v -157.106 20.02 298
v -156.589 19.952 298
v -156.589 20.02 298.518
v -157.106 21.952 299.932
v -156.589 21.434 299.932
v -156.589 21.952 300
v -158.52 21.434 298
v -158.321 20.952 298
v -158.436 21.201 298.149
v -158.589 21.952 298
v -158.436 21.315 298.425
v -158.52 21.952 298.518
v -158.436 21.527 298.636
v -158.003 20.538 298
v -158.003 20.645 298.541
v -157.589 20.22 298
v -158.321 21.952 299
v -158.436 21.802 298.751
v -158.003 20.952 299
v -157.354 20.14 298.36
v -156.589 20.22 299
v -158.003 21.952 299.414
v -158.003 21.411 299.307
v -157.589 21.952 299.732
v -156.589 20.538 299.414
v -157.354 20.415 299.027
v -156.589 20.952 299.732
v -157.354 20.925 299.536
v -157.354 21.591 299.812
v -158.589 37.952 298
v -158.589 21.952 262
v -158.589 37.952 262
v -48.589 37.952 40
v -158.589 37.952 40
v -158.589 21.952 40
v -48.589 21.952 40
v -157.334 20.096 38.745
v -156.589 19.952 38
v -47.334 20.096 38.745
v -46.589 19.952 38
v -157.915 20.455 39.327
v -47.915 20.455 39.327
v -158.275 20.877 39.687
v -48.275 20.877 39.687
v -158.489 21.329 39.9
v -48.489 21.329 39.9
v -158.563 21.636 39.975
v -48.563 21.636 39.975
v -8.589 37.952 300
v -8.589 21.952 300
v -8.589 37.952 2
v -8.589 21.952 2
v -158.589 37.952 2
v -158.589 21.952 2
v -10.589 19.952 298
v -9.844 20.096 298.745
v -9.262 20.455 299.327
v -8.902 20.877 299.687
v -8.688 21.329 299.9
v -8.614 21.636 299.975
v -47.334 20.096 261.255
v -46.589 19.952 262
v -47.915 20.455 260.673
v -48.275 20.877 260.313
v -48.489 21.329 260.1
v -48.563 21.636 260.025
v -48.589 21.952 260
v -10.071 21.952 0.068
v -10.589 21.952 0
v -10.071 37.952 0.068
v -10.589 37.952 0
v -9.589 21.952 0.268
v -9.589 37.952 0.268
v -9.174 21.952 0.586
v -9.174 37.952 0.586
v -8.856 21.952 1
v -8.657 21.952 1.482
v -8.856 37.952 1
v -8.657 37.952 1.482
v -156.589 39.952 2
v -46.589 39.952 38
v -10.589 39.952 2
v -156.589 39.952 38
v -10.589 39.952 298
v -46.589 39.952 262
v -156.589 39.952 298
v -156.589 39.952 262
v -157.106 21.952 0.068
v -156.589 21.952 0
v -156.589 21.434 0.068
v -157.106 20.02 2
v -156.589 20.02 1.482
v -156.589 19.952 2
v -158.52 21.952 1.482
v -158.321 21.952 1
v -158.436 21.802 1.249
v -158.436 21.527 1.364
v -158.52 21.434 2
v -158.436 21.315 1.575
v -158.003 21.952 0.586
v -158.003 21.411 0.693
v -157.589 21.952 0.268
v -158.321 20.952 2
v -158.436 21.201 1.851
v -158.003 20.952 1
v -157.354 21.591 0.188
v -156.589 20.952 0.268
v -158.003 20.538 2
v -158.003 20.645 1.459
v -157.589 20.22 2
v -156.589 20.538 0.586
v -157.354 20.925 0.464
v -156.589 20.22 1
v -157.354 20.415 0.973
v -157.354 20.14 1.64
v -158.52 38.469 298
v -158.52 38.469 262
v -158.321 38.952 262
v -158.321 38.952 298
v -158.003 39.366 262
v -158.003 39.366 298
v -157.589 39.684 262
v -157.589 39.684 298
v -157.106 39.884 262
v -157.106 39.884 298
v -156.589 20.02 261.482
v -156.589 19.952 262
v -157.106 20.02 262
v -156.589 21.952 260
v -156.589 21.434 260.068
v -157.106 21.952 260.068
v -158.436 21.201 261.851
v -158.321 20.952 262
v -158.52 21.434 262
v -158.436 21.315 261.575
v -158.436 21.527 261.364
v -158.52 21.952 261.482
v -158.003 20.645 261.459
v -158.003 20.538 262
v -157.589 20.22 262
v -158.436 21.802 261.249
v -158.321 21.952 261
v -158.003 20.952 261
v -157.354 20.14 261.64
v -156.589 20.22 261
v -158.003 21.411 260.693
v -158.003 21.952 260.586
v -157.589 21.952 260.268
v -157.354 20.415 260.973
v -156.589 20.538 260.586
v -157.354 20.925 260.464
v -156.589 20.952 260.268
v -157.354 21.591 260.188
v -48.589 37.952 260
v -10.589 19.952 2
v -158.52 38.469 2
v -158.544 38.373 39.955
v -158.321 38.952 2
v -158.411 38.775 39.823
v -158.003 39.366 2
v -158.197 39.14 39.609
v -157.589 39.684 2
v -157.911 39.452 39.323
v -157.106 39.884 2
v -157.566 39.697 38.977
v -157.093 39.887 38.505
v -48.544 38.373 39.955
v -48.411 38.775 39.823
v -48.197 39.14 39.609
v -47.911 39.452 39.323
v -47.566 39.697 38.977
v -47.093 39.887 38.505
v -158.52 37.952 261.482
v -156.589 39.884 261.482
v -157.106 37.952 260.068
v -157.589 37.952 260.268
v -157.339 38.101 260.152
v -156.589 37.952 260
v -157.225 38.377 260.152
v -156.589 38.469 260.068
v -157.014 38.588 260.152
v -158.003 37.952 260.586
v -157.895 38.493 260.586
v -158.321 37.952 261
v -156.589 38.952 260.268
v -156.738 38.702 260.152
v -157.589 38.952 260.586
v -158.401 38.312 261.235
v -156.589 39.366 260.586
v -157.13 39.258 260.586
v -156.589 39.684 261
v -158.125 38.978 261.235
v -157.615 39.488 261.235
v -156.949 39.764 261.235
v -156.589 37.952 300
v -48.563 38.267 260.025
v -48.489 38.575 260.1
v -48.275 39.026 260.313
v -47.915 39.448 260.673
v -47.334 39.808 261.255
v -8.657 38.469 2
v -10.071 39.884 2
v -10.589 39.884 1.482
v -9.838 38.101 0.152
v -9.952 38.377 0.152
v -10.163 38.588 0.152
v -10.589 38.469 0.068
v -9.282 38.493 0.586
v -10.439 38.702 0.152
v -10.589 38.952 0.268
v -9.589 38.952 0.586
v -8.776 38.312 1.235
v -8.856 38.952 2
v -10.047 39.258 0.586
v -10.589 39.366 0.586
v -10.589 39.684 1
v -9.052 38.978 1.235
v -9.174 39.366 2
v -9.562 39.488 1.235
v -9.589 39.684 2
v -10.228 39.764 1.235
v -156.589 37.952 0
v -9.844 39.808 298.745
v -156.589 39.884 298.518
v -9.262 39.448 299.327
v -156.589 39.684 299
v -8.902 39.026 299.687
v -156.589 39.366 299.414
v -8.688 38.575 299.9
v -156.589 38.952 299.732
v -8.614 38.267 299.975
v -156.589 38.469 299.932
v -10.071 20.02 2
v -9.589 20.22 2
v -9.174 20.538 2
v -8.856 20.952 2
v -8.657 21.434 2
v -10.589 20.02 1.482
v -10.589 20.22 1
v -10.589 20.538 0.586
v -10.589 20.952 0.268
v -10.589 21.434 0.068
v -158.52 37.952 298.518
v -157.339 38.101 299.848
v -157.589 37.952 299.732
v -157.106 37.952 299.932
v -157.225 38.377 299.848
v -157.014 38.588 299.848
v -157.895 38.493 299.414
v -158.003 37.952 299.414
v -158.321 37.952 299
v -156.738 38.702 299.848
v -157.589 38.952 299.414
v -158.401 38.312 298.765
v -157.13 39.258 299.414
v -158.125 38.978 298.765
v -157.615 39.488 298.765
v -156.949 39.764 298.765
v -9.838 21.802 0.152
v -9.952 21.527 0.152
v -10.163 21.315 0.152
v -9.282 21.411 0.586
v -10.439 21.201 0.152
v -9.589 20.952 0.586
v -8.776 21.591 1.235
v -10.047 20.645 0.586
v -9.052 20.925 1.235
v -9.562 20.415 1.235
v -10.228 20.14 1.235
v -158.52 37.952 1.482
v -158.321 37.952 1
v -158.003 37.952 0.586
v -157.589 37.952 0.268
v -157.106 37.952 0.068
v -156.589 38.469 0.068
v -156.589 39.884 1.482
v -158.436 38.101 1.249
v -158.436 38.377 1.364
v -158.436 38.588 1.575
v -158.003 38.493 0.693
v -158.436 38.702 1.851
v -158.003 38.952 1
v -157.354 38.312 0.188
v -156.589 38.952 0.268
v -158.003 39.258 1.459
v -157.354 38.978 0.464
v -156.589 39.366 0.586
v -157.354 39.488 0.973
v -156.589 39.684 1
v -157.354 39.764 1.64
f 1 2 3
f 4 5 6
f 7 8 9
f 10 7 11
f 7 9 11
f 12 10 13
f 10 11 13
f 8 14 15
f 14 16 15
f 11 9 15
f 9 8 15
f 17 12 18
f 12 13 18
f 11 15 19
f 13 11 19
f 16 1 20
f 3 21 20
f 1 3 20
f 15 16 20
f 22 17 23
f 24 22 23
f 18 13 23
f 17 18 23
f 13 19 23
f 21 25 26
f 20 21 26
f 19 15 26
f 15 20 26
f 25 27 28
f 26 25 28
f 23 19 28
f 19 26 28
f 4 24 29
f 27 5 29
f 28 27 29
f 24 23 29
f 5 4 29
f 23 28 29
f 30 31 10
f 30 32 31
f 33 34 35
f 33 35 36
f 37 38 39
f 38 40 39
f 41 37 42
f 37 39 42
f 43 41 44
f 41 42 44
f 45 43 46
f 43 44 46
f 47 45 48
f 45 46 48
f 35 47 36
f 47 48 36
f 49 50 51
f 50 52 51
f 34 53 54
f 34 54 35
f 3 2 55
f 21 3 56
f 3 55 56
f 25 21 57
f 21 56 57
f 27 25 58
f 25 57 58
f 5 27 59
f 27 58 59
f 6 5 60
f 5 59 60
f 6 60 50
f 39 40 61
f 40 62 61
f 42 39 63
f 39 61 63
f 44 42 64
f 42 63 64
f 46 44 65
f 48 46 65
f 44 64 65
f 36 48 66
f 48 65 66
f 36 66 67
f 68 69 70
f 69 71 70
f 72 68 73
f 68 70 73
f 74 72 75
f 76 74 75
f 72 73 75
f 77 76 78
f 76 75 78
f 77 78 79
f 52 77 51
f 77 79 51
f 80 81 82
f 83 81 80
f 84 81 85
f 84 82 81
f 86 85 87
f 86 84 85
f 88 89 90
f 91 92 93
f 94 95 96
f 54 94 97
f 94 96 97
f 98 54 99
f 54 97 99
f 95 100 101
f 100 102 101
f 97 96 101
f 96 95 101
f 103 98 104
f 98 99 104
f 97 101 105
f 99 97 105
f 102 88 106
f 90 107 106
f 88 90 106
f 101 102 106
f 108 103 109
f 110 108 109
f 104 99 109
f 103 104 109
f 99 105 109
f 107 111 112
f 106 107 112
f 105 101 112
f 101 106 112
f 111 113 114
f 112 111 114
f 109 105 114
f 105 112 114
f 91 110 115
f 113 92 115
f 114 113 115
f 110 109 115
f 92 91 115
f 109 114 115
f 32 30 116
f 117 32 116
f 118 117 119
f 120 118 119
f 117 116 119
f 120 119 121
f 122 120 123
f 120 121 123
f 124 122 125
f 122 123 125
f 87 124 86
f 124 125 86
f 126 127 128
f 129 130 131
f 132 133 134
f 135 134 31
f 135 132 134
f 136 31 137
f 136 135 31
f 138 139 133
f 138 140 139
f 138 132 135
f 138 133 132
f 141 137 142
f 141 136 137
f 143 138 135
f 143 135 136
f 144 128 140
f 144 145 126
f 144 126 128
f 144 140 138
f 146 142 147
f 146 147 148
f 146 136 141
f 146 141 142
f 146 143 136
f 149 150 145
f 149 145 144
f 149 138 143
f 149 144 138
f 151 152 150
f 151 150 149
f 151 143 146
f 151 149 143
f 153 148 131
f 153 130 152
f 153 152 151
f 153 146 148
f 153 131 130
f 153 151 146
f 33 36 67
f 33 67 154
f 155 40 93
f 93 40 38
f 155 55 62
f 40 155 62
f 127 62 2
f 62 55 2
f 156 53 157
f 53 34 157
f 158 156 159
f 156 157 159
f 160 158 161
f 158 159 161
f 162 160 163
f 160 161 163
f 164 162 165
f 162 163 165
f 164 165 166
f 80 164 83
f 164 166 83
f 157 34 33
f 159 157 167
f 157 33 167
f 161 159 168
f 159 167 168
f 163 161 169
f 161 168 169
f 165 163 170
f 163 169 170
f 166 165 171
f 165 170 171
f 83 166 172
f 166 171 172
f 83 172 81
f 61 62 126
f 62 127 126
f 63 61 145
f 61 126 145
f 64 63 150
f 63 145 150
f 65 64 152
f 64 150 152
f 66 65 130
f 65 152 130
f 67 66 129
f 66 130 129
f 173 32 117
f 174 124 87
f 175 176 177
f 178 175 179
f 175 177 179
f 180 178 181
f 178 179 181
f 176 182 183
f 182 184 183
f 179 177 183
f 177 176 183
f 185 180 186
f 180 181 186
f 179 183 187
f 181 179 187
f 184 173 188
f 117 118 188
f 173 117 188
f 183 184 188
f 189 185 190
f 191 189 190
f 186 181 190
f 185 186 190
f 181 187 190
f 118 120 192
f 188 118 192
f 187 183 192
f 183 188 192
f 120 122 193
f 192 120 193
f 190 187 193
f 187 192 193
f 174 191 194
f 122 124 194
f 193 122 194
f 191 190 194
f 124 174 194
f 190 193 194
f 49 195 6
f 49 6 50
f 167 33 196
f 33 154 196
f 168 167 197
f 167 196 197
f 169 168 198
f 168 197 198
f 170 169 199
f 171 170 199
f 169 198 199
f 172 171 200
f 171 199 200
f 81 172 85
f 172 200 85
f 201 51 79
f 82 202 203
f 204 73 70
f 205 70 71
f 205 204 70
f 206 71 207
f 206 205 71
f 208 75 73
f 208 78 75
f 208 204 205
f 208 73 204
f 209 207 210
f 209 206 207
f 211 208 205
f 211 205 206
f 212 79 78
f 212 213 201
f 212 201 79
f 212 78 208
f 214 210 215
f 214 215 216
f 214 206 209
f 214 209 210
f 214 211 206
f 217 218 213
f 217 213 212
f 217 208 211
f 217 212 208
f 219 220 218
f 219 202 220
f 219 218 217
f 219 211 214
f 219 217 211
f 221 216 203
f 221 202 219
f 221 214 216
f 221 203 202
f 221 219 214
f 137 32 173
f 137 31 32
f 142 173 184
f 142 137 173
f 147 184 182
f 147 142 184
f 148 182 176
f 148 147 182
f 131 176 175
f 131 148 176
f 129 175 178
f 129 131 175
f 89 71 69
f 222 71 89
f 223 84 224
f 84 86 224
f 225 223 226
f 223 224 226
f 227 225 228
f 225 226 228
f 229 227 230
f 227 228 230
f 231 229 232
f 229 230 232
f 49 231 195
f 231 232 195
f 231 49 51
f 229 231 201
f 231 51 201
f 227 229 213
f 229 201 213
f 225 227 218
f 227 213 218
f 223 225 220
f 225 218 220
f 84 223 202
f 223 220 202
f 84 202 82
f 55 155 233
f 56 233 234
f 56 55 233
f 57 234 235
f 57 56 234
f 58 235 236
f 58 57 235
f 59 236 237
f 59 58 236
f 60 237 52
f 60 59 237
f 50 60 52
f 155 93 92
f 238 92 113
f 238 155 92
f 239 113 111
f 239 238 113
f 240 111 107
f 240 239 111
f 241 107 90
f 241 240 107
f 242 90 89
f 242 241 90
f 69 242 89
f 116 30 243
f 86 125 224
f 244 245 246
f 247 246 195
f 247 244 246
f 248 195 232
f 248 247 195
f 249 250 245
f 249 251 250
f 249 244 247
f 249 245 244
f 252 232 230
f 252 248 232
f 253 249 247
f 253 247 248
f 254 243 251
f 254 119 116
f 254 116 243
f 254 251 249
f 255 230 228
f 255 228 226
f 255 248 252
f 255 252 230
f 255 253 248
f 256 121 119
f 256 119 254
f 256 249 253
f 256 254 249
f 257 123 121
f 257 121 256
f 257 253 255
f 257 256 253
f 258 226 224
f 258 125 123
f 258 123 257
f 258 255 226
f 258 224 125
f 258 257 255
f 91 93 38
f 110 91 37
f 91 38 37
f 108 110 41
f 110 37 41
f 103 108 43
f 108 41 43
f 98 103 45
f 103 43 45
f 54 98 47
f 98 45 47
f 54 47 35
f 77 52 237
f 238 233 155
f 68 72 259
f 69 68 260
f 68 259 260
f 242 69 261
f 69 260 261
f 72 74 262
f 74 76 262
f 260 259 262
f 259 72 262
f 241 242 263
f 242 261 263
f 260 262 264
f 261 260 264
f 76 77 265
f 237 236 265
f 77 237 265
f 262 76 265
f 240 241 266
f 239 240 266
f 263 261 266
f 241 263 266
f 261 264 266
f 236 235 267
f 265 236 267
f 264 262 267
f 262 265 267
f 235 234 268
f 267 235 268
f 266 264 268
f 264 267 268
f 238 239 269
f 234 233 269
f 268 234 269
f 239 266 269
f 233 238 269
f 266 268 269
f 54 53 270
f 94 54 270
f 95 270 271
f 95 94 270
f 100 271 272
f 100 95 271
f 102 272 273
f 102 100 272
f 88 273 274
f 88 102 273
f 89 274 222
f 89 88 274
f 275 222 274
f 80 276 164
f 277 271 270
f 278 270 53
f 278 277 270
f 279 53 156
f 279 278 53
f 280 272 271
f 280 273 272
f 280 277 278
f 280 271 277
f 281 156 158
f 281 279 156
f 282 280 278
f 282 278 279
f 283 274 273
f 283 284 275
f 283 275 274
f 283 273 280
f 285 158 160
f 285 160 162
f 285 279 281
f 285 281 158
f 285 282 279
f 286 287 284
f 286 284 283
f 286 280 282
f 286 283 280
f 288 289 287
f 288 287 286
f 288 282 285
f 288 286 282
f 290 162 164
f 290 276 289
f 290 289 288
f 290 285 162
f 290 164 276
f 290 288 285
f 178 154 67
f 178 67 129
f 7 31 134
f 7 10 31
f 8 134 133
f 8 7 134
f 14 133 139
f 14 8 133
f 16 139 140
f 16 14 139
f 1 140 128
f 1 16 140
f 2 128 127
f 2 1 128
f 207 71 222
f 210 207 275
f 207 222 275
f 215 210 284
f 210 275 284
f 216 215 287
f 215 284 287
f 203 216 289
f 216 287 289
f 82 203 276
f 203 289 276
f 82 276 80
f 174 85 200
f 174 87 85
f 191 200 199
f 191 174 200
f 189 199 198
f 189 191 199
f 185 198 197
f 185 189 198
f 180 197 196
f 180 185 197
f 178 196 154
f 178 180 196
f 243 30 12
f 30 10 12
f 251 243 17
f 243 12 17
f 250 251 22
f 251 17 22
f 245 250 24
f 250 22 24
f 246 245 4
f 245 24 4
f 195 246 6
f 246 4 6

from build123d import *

# Parameters (mm, degrees)
F0_W     = 40
F0_H     = 20
F1_DEPTH = 300
F2_W     = 110
F2_H     = 40
F2_W_2   = 40
F3_DEPTH = 20
F4_R     = 2


with BuildPart() as f1:
    # F0 (on Top) → F1 (new body)
    with BuildSketch(Plane.XY):
        with Locations((-28.588508, 29.951763)):
            Rectangle(F0_W, F0_H)
    extrude(amount=F1_DEPTH)

    # F2 (on face) → F3 (join)
    with BuildSketch(Plane(origin=(0, 39.951763, 0), x_dir=(-1, 0, 0), z_dir=(0, 1, 0))):
        with Locations((103.588508, 280)):
            Rectangle(F2_W, F2_H)
        with Locations((28.588508, 280)):
            Rectangle(F2_W_2, F2_H)
        with Locations((28.588508, 20)):
            Rectangle(F2_W_2, F2_H)
        with Locations((103.588508, 20)):
            Rectangle(F2_W, F2_H)
    extrude(amount=-F3_DEPTH)

    # F4
    f4_edges = [f1.edges().sort_by_distance(p)[0] for p in [
        (-103.588508, 19.951763, 260),
        (-48.588508, 19.951763, 150),
        (-8.588508, 19.951763, 150),
        (-83.588508, 19.951763, 300),
        (-158.588508, 19.951763, 280),
        (-158.588508, 39.951763, 280),
        (-158.588508, 29.951763, 260),
        (-158.588508, 29.951763, 300),
        (-83.588508, 39.951763, 300),
        (-103.588508, 39.951763, 260),
        (-48.588508, 39.951763, 150),
        (-8.588508, 39.951763, 150),
        (-8.588508, 29.951763, 0),
        (-83.588508, 39.951763, 0),
        (-83.588508, 19.951763, 0),
        (-158.588508, 29.951763, 0),
        (-158.588508, 39.951763, 20),
        (-158.588508, 19.951763, 20),
        (-103.588508, 19.951763, 40),
        (-103.588508, 39.951763, 40),
    ]]
    fillet(f4_edges, radius=F4_R)


solid = f1.part
